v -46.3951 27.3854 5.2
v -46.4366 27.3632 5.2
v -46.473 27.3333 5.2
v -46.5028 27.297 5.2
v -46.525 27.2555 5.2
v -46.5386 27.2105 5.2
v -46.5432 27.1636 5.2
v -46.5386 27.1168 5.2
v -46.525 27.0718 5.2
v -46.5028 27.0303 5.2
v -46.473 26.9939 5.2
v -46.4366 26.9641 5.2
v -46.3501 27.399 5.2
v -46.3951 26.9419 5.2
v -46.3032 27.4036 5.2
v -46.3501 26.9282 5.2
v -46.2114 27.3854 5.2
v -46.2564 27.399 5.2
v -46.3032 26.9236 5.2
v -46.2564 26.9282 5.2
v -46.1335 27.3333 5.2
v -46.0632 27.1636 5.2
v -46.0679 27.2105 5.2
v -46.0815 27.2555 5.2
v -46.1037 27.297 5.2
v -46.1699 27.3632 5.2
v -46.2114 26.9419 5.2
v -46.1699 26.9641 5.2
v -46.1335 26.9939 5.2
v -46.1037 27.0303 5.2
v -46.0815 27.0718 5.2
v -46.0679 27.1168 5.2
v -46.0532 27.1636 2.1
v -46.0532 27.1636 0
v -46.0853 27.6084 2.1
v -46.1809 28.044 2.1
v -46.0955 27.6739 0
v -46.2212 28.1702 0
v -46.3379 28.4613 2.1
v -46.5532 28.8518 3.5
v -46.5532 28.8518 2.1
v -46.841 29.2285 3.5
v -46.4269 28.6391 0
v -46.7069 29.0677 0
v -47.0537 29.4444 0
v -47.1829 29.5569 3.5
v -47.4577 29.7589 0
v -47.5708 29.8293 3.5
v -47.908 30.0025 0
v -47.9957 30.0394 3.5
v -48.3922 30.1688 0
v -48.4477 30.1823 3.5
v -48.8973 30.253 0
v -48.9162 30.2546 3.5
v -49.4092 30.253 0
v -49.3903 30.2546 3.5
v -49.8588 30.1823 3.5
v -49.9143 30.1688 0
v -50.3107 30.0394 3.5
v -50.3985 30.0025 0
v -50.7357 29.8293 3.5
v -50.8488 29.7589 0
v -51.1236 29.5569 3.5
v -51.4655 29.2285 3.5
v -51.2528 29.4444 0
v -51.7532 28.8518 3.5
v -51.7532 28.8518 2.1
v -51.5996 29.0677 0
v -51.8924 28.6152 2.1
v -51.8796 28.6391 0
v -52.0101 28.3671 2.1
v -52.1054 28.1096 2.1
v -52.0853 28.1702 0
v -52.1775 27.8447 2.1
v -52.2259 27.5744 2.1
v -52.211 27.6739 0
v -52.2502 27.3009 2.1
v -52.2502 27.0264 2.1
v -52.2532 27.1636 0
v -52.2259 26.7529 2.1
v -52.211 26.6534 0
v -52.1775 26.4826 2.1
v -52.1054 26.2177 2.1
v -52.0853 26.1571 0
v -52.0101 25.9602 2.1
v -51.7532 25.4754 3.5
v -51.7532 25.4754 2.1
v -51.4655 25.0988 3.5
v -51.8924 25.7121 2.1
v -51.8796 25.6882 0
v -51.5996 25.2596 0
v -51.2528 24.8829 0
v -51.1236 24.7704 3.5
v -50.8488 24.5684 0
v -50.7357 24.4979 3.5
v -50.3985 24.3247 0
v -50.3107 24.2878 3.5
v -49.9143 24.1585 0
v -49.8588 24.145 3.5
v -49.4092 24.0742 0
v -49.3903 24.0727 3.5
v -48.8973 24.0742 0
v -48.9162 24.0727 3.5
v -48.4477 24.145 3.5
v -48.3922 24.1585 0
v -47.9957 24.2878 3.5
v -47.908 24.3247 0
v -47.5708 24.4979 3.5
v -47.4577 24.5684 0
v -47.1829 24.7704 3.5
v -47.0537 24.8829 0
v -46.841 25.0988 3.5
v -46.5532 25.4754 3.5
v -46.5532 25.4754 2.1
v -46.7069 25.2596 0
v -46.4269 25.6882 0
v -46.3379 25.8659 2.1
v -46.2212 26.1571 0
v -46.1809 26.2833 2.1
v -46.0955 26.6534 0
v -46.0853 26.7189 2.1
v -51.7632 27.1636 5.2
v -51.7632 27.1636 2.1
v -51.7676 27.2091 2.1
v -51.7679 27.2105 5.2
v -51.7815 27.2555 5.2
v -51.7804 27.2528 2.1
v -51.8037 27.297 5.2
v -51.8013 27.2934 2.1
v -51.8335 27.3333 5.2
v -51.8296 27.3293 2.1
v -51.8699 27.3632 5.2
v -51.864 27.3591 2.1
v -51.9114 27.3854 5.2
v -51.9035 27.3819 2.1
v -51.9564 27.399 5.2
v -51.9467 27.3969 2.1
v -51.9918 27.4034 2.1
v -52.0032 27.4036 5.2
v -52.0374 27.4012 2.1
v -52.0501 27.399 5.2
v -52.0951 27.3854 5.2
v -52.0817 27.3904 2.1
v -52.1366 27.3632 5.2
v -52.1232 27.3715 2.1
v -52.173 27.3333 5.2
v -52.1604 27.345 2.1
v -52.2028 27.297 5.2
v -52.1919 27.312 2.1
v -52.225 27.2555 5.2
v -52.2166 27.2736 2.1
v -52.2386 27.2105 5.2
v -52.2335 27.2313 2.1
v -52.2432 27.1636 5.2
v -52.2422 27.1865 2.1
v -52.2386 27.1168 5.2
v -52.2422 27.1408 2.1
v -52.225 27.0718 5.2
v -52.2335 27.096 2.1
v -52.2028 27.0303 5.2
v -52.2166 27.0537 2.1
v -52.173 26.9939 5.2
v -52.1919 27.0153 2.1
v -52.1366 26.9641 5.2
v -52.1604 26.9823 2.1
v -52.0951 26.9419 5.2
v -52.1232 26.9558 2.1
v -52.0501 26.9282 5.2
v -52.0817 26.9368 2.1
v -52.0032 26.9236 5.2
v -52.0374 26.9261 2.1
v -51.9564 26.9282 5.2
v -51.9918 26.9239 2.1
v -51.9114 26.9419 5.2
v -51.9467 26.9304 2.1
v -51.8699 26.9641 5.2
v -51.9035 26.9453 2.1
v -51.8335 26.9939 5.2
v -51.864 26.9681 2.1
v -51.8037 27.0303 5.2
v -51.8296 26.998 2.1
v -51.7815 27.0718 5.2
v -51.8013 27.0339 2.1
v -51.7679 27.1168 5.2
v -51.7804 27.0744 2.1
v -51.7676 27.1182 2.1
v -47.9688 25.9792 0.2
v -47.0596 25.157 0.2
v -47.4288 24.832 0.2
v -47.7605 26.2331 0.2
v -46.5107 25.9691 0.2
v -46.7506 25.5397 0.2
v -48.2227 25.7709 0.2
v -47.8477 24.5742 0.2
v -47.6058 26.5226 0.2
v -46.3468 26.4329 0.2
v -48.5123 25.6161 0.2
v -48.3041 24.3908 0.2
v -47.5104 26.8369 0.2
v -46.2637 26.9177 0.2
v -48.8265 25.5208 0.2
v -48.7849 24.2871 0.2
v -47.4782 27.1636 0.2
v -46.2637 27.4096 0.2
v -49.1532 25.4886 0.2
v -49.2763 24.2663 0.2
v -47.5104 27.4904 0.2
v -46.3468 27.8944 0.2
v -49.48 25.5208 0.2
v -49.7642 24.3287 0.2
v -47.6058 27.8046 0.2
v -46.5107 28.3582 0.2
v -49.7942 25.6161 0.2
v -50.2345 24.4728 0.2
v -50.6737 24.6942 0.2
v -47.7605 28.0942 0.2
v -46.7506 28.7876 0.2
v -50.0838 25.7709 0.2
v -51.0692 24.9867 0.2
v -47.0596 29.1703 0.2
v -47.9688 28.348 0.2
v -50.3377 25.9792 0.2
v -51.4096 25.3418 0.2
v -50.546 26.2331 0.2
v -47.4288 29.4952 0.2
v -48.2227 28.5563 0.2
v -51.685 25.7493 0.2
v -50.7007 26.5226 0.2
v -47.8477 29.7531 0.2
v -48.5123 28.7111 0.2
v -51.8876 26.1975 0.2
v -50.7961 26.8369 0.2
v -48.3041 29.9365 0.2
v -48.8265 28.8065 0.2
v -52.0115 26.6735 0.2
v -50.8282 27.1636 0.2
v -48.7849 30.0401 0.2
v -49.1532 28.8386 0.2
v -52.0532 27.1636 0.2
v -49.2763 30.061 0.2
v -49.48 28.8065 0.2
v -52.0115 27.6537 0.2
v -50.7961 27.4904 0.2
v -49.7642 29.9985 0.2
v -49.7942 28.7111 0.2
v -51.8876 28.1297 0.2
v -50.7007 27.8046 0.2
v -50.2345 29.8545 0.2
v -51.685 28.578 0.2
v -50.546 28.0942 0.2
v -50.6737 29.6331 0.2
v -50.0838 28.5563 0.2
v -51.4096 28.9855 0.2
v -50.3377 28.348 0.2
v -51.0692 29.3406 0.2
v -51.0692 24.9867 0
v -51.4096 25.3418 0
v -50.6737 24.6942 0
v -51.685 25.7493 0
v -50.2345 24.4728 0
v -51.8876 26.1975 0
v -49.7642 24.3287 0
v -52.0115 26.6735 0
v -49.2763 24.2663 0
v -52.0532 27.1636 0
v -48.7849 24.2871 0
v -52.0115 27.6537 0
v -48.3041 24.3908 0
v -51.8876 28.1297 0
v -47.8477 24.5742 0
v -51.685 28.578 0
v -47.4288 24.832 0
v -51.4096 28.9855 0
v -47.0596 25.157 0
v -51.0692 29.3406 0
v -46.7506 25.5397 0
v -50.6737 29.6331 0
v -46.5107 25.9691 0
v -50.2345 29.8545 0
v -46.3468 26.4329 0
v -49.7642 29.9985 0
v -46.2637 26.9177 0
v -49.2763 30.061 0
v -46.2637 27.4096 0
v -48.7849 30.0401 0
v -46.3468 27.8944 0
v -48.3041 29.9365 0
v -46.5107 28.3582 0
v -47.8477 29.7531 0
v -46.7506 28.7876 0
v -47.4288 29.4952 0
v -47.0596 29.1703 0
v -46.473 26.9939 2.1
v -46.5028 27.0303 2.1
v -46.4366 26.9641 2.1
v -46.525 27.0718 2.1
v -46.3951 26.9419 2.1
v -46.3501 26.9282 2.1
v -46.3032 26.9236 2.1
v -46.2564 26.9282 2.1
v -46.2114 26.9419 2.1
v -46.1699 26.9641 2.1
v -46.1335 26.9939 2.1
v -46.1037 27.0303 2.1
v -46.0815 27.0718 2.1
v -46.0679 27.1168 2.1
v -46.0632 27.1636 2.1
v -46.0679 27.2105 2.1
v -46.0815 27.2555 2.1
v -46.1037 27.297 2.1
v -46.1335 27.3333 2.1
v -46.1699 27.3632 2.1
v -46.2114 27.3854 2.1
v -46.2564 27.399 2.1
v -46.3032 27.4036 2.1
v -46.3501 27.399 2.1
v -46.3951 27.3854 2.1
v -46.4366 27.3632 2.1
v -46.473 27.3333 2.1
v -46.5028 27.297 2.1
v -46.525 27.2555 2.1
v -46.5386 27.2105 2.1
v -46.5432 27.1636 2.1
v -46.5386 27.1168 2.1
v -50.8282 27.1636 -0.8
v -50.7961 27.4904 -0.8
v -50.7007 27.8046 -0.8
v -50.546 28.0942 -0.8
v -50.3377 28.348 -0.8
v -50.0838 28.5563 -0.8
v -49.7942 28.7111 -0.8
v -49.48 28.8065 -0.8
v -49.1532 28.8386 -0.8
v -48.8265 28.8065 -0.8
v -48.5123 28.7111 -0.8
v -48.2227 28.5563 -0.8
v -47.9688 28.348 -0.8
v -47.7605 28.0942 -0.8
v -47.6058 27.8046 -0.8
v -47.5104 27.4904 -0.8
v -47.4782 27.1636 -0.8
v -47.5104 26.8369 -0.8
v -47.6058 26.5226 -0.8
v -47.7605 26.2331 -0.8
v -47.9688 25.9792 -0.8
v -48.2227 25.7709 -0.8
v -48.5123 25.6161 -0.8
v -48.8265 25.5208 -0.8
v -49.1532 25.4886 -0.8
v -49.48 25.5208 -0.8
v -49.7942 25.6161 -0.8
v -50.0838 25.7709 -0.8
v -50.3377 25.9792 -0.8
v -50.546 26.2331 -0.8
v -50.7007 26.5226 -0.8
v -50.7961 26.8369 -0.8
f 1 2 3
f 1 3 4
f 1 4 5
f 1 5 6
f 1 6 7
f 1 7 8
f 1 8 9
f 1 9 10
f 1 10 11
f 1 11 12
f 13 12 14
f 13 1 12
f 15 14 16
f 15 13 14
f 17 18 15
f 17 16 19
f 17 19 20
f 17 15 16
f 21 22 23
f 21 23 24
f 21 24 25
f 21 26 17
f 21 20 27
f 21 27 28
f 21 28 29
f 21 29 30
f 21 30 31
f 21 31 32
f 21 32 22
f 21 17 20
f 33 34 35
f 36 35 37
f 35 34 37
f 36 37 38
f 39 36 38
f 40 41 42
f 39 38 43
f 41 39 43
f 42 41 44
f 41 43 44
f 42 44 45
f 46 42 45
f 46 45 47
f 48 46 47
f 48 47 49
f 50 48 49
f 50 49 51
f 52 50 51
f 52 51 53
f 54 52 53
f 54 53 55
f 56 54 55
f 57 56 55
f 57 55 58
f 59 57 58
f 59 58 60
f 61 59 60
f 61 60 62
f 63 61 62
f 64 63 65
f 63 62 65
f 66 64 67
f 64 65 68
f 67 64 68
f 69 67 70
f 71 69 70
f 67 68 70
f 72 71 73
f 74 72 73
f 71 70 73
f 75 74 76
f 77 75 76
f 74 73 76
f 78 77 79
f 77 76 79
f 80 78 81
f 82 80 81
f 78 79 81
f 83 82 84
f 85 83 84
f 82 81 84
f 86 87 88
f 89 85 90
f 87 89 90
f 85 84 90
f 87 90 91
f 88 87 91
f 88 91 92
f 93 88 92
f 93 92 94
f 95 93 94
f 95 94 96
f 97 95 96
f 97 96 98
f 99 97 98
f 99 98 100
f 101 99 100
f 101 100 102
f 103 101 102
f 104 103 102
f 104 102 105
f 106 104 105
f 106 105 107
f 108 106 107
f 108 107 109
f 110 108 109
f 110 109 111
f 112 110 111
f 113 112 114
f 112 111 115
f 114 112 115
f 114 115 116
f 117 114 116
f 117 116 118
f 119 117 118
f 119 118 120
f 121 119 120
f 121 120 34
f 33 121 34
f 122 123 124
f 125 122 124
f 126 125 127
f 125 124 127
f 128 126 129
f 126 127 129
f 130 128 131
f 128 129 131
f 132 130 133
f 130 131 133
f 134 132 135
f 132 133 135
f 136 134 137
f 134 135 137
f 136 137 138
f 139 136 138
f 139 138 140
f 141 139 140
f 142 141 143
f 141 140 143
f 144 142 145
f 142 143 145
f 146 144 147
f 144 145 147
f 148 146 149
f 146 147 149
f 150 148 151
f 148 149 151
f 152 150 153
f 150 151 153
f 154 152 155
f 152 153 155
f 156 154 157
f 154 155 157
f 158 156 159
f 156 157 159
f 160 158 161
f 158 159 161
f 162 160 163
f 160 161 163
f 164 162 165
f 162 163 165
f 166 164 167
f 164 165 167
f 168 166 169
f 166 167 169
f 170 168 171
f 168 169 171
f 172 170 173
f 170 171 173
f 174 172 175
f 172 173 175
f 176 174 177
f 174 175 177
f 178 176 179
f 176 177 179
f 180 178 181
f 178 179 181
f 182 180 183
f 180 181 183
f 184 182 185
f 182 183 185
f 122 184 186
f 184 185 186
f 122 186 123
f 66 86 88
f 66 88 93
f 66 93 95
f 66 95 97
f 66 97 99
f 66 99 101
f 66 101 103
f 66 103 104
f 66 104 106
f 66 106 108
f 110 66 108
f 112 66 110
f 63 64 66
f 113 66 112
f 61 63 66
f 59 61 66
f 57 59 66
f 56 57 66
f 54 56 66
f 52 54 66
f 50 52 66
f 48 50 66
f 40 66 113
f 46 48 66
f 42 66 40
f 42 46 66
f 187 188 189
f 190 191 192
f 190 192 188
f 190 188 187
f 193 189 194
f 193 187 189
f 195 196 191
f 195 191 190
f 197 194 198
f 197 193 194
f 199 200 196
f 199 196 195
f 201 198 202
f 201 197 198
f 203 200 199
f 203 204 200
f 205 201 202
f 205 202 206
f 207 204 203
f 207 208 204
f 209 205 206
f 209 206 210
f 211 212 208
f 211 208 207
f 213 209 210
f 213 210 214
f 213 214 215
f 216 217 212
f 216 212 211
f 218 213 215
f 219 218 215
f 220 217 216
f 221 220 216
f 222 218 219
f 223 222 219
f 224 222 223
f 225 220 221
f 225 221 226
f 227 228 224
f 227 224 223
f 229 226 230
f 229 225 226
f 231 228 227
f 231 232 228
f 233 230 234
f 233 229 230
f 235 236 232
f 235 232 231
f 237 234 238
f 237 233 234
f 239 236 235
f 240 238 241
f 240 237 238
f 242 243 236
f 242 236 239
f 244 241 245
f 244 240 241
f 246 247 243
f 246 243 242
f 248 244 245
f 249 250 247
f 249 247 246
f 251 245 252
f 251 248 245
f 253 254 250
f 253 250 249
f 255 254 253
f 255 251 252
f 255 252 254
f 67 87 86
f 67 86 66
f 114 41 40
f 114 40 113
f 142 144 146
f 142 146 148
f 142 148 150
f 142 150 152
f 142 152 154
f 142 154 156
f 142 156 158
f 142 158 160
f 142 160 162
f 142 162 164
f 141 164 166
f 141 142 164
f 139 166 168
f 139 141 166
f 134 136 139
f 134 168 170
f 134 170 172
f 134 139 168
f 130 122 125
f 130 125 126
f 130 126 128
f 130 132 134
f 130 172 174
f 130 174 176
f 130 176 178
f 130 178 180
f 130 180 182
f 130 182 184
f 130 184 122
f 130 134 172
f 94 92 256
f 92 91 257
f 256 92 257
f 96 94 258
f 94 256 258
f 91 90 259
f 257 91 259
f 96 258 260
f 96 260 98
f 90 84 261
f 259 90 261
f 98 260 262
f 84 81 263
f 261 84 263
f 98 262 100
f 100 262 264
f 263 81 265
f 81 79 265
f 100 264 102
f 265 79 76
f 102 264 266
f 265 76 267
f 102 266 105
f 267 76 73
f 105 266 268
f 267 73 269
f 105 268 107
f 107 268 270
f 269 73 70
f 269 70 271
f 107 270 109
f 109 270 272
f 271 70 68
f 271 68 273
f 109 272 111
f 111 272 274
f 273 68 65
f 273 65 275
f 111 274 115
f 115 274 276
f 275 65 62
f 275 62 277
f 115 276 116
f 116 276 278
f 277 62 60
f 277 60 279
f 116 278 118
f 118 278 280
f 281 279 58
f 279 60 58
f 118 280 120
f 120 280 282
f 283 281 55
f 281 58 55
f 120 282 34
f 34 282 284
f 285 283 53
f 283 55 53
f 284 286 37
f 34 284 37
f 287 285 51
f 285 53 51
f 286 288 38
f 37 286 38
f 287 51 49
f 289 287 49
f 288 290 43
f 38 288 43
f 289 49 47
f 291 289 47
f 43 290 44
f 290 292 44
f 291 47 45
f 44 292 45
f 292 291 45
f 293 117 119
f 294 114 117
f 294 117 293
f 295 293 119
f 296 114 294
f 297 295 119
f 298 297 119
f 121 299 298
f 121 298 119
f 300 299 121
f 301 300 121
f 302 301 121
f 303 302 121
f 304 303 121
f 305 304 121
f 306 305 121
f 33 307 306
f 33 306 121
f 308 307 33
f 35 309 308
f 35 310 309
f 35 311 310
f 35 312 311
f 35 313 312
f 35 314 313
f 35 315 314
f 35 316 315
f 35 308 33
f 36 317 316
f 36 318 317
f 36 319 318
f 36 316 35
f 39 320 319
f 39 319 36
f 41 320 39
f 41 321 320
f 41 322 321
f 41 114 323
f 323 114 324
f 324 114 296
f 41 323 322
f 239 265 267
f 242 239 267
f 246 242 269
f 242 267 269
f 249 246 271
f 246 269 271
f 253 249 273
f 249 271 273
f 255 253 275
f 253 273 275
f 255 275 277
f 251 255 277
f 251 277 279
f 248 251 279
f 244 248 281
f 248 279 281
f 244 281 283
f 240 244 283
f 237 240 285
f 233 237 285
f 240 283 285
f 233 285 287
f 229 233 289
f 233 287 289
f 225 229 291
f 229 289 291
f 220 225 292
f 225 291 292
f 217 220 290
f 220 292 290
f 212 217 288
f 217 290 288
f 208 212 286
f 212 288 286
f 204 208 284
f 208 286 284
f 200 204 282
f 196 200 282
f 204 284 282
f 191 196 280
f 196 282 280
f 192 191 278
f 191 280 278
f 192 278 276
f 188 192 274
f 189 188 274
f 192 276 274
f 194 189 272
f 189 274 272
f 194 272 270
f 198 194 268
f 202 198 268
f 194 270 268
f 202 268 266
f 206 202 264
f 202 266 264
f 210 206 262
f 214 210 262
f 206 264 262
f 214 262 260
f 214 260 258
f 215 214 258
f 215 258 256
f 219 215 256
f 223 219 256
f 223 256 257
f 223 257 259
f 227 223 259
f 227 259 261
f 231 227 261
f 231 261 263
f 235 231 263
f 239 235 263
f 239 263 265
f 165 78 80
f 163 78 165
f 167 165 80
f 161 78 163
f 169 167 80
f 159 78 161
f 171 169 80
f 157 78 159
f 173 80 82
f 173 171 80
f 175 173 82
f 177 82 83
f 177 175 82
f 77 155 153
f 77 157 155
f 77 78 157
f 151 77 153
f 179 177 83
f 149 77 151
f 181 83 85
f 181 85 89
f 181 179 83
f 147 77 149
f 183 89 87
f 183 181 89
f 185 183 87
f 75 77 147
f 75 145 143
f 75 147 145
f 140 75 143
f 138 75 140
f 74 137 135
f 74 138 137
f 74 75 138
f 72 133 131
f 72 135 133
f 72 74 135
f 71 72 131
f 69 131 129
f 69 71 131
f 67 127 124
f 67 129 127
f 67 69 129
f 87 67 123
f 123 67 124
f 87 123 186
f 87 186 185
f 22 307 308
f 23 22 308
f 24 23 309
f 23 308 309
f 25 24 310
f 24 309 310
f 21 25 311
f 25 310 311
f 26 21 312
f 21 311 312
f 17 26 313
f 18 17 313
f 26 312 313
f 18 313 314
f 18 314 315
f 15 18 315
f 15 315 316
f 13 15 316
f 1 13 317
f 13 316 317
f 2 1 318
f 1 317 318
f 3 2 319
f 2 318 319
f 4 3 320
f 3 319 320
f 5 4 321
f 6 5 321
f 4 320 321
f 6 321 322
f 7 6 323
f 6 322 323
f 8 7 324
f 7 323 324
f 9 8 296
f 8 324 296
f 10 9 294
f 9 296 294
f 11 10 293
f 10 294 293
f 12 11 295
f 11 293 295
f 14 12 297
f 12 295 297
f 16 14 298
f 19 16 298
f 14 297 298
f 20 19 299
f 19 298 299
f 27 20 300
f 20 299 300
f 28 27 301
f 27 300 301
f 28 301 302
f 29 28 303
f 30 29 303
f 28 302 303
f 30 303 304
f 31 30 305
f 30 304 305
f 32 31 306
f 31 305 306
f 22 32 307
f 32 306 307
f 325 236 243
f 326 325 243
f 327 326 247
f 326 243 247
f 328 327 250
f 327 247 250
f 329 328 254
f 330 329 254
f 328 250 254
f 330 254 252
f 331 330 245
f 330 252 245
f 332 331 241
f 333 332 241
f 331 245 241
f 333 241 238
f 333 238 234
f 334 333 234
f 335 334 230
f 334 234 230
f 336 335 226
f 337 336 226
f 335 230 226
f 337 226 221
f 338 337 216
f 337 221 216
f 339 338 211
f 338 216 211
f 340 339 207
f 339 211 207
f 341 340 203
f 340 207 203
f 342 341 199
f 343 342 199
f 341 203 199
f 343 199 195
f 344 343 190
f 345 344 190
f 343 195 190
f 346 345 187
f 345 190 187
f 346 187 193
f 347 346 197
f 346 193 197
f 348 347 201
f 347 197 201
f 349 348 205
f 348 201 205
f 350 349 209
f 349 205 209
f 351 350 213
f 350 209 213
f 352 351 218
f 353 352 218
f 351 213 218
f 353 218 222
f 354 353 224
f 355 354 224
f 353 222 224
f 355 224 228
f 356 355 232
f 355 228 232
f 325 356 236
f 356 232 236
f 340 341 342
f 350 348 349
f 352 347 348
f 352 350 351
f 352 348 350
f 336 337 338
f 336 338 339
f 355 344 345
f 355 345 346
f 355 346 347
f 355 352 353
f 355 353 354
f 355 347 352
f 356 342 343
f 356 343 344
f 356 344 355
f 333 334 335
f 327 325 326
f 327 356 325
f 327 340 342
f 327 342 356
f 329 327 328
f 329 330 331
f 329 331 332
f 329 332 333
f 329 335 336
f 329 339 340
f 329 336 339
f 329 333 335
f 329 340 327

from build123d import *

# Parameters (mm, degrees)
SKETCH1_R            = 3.1
BOSS_EXTRUDE1_DEPTH  = 3.5
CUT_EXTRUDE1_START   = -1.4
CUT_EXTRUDE1_DEPTH   = 1.4
SKETCH4_R            = 0.24
BOSS_EXTRUDE23_DEPTH = 3.1
SKETCH5_R            = 0.24
BOSS_EXTRUDE24_DEPTH = 3.1
SKETCH6_R            = 2.9
CUT_EXTRUDE3_DEPTH   = 0.2
SKETCH7_R            = 1.675
BOSS_EXTRUDE25_DEPTH = 1


with BuildPart() as part:
    # Sketch1 → Boss-Extrude1 (new body)
    with BuildSketch(Plane.XY):
        with Locations((-49.1532488, 27.163637495)):
            Circle(SKETCH1_R)
    extrude(amount=BOSS_EXTRUDE1_DEPTH)

    # Sketch2 → Cut-Extrude1 (cut)
    with BuildSketch(Plane.XY.offset(3.5).offset(CUT_EXTRUDE1_START)):
        with BuildLine():
            Line((-51.7532488, 27.163637495), (-51.7532488, 28.851831796))
            ThreePointArc((-51.7532488, 28.851831796), (-52.2532488, 27.163637495), (-51.7532488, 25.475443193))
            Line((-51.7532488, 25.475443193), (-51.7532488, 27.163637495))
        make_face()
        with BuildLine():
            Line((-46.5532488, 27.163637495), (-46.5532488, 25.475443193))
            ThreePointArc((-46.5532488, 25.475443193), (-46.0532488, 27.163637495), (-46.5532488, 28.851831796))
            Line((-46.5532488, 28.851831796), (-46.5532488, 27.163637495))
        make_face()
    extrude(amount=CUT_EXTRUDE1_DEPTH, mode=Mode.SUBTRACT)

    # Sketch4 → Boss-Extrude23 (add)
    with BuildSketch(Plane.XY.offset(2.1)):
        with Locations((-46.3032488, 27.163637495)):
            Circle(SKETCH4_R)
    extrude(amount=BOSS_EXTRUDE23_DEPTH)

    # Sketch5 → Boss-Extrude24 (add)
    with BuildSketch(Plane.XY.offset(2.1)):
        with Locations((-52.0032488, 27.163637495)):
            Circle(SKETCH5_R)
    extrude(amount=BOSS_EXTRUDE24_DEPTH)

    # Sketch6 → Cut-Extrude3 (cut)
    with BuildSketch(Plane(origin=(0, 0, 0), x_dir=(-1, 0, 0), z_dir=(0, 0, -1))):
        with Locations((49.1532488, 27.163637495)):
            Circle(SKETCH6_R)
    extrude(amount=-CUT_EXTRUDE3_DEPTH, mode=Mode.SUBTRACT)

    # Sketch7 → Boss-Extrude25 (add)
    with BuildSketch(Plane(origin=(0, 0, 0.2), x_dir=(-1, 0, 0), z_dir=(0, 0, -1))):
        with Locations((49.1532488, 27.163637495)):
            Circle(SKETCH7_R)
    extrude(amount=BOSS_EXTRUDE25_DEPTH)


solid = part.part
